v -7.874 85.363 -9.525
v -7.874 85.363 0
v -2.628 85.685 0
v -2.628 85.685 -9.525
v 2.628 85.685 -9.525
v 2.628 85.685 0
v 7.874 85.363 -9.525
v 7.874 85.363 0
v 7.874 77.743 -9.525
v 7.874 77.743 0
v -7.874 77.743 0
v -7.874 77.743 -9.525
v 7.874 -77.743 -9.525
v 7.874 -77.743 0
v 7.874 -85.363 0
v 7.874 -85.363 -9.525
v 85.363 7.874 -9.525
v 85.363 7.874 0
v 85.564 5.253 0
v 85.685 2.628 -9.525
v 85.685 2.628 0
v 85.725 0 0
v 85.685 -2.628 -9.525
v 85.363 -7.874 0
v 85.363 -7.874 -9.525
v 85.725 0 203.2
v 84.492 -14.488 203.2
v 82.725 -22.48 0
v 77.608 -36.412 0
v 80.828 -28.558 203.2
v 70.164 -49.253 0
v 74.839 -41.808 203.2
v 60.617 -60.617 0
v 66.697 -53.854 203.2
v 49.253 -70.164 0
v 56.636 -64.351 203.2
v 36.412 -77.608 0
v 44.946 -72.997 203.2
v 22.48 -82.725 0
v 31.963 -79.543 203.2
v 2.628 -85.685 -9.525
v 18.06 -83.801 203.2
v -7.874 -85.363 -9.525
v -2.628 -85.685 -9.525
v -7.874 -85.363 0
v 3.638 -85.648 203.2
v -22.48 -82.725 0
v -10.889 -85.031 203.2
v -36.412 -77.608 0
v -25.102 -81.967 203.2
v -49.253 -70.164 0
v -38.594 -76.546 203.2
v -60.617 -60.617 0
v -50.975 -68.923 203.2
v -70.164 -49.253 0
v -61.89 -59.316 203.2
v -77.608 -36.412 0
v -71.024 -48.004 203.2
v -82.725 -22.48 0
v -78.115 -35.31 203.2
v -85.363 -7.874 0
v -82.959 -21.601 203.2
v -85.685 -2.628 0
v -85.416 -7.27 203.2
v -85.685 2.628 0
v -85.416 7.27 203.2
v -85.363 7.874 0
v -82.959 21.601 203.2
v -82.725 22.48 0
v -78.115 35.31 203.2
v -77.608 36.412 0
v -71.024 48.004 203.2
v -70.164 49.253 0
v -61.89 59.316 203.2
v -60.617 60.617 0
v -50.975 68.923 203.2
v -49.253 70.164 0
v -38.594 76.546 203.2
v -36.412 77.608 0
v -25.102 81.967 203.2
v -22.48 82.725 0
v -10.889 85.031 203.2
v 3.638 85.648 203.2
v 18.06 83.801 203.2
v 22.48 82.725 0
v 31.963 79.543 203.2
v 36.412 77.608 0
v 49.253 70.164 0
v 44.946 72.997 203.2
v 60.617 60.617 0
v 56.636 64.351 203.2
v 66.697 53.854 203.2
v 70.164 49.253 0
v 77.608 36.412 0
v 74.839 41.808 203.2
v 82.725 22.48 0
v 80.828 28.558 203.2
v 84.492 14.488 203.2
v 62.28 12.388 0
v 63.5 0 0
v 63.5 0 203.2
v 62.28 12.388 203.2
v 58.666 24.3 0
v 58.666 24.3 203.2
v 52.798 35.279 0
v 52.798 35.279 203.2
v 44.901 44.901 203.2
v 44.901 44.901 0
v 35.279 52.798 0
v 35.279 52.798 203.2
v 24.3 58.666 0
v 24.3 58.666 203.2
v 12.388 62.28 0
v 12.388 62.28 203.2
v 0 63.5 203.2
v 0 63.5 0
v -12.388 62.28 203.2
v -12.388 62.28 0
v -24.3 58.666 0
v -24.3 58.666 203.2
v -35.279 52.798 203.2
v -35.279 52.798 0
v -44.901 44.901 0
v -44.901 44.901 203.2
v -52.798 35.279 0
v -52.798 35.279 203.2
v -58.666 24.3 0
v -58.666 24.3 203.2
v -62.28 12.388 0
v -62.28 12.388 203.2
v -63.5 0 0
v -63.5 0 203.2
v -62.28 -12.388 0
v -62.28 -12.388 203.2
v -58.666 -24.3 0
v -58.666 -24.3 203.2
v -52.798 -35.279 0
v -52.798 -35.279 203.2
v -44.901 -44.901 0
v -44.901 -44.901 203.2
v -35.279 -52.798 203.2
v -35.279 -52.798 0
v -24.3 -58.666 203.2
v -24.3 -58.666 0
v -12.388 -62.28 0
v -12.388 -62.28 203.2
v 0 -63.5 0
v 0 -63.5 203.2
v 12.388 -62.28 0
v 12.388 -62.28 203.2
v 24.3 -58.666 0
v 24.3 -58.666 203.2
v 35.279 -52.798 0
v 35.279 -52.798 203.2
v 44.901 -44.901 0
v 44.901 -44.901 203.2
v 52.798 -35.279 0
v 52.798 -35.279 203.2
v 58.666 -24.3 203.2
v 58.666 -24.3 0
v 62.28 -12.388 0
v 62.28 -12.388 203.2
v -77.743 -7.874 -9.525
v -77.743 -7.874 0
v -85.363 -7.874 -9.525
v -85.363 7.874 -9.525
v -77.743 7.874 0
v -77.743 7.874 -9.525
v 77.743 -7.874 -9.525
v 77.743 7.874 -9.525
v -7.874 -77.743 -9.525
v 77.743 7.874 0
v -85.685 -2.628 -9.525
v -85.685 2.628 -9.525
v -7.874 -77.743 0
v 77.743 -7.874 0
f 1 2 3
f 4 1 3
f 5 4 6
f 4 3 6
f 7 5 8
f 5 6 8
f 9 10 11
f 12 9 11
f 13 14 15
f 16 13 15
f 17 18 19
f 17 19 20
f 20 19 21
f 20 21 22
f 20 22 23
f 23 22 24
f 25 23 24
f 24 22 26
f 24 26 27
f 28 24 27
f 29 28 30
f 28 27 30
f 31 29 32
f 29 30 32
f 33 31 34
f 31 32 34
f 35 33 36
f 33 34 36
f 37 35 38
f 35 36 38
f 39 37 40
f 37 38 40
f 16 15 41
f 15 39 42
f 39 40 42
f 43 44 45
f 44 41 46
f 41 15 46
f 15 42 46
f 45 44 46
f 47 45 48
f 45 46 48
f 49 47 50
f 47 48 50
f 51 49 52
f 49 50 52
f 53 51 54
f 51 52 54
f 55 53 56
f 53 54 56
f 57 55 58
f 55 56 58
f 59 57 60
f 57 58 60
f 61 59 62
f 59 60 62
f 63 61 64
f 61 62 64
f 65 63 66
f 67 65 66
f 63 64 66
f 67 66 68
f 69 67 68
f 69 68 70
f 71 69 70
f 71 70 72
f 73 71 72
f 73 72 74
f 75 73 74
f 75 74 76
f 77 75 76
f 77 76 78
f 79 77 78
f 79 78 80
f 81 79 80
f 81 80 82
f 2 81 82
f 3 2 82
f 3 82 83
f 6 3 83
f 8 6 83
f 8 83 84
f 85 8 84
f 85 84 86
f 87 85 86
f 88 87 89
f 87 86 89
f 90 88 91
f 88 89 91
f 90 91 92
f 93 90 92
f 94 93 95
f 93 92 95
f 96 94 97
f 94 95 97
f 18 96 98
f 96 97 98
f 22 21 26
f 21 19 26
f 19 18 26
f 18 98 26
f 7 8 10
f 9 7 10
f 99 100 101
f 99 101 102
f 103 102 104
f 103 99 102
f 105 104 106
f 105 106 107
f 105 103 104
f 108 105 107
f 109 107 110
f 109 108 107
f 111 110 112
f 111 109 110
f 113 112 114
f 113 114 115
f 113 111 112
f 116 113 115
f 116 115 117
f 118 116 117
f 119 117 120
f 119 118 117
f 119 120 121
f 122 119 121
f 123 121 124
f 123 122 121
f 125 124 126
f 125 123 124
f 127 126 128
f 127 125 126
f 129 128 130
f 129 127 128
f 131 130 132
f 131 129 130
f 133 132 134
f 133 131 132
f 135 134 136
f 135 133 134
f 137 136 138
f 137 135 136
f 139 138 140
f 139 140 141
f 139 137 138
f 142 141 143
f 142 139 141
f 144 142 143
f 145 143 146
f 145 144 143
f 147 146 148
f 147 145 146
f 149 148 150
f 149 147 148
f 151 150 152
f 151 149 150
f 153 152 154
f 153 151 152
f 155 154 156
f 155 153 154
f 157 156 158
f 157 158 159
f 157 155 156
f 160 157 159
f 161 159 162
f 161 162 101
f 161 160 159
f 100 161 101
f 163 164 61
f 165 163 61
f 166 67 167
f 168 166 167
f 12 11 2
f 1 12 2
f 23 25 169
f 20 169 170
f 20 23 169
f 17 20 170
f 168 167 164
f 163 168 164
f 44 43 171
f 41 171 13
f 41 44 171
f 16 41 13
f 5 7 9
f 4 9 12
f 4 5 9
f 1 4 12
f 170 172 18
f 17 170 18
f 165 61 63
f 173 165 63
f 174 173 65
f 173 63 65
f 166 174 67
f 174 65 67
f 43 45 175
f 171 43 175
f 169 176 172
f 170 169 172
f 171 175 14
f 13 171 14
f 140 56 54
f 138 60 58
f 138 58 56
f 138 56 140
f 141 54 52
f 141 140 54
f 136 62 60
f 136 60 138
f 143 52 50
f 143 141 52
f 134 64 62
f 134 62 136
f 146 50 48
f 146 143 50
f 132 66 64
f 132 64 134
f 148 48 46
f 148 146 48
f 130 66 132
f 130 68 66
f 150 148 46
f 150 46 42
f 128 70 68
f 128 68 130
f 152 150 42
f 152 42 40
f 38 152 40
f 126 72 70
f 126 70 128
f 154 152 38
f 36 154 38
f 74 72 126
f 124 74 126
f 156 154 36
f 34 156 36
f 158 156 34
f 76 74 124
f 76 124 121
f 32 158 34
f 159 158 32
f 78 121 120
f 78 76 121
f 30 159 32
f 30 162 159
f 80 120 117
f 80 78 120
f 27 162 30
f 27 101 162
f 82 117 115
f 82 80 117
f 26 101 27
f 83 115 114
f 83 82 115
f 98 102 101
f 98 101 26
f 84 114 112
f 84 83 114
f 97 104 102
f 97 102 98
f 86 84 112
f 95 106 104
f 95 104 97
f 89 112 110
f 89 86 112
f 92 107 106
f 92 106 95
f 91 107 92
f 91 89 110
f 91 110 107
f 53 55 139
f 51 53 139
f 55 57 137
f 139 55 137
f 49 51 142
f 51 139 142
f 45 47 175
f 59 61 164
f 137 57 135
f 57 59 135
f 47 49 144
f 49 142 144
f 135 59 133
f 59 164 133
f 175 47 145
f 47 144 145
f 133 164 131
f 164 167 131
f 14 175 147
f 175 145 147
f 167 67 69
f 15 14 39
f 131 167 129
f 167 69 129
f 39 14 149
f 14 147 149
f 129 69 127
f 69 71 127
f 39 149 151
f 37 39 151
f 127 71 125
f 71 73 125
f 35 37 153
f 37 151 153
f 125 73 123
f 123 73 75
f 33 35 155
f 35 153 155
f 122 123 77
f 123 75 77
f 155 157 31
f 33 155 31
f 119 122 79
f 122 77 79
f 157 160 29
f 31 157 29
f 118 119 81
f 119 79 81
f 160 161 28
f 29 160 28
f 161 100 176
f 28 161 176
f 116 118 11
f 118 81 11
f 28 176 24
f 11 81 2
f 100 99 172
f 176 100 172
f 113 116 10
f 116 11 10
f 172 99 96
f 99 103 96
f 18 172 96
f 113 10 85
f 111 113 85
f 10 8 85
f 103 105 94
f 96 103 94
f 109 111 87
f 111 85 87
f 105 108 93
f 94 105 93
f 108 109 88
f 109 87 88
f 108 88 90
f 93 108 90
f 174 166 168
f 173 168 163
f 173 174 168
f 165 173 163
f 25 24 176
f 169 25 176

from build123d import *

# Parameters (mm, degrees)
F0_R            = 85.725
F0_R_2          = 63.5
F1_DEPTH        = 203.2
F3_DEPTH        = 9.525
F3_COPIES_COUNT = 4


# Not quite as in the source:
# - after a boolean that leaves OpenCascade's solid faulty, fix() repairs it
# - a pattern or mirror of a feature is missing from the dataset's text; its kind, count and spacing are read off the source's solid


with BuildPart() as f1:
    # F0 (on Top) → F1 (new body)
    with BuildSketch(Plane.XY):
        Circle(F0_R)
        Circle(F0_R_2, mode=Mode.SUBTRACT)
    extrude(amount=F1_DEPTH)

    # F2 (on face) → F3 (join)
    with BuildSketch(Plane(origin=(0, 0, 0), x_dir=(1, 0, 0), z_dir=(0, 0, -1))):
        with BuildLine():
            Line((-7.874, 85.3626132976), (-7.874, 77.7426132976))
            Line((-7.874, 77.7426132976), (7.874, 77.7426132976))
            Line((7.874, 77.7426132976), (7.874, 85.3626132976))
            ThreePointArc((7.874, 85.3626132976), (0, 85.725), (-7.874, 85.3626132976))
        make_face()
    f3 = extrude(amount=F3_DEPTH)

    # F3_copies: F3 ×4 about axis
    f3_copies_axis = Axis((0, 0, 0), (0, 0, 1))
    for i in range(1, F3_COPIES_COUNT):
        add(f3.rotate(f3_copies_axis, i * 360 / F3_COPIES_COUNT))

    add(f1.part.fix(), mode=Mode.REPLACE)


solid = f1.part
